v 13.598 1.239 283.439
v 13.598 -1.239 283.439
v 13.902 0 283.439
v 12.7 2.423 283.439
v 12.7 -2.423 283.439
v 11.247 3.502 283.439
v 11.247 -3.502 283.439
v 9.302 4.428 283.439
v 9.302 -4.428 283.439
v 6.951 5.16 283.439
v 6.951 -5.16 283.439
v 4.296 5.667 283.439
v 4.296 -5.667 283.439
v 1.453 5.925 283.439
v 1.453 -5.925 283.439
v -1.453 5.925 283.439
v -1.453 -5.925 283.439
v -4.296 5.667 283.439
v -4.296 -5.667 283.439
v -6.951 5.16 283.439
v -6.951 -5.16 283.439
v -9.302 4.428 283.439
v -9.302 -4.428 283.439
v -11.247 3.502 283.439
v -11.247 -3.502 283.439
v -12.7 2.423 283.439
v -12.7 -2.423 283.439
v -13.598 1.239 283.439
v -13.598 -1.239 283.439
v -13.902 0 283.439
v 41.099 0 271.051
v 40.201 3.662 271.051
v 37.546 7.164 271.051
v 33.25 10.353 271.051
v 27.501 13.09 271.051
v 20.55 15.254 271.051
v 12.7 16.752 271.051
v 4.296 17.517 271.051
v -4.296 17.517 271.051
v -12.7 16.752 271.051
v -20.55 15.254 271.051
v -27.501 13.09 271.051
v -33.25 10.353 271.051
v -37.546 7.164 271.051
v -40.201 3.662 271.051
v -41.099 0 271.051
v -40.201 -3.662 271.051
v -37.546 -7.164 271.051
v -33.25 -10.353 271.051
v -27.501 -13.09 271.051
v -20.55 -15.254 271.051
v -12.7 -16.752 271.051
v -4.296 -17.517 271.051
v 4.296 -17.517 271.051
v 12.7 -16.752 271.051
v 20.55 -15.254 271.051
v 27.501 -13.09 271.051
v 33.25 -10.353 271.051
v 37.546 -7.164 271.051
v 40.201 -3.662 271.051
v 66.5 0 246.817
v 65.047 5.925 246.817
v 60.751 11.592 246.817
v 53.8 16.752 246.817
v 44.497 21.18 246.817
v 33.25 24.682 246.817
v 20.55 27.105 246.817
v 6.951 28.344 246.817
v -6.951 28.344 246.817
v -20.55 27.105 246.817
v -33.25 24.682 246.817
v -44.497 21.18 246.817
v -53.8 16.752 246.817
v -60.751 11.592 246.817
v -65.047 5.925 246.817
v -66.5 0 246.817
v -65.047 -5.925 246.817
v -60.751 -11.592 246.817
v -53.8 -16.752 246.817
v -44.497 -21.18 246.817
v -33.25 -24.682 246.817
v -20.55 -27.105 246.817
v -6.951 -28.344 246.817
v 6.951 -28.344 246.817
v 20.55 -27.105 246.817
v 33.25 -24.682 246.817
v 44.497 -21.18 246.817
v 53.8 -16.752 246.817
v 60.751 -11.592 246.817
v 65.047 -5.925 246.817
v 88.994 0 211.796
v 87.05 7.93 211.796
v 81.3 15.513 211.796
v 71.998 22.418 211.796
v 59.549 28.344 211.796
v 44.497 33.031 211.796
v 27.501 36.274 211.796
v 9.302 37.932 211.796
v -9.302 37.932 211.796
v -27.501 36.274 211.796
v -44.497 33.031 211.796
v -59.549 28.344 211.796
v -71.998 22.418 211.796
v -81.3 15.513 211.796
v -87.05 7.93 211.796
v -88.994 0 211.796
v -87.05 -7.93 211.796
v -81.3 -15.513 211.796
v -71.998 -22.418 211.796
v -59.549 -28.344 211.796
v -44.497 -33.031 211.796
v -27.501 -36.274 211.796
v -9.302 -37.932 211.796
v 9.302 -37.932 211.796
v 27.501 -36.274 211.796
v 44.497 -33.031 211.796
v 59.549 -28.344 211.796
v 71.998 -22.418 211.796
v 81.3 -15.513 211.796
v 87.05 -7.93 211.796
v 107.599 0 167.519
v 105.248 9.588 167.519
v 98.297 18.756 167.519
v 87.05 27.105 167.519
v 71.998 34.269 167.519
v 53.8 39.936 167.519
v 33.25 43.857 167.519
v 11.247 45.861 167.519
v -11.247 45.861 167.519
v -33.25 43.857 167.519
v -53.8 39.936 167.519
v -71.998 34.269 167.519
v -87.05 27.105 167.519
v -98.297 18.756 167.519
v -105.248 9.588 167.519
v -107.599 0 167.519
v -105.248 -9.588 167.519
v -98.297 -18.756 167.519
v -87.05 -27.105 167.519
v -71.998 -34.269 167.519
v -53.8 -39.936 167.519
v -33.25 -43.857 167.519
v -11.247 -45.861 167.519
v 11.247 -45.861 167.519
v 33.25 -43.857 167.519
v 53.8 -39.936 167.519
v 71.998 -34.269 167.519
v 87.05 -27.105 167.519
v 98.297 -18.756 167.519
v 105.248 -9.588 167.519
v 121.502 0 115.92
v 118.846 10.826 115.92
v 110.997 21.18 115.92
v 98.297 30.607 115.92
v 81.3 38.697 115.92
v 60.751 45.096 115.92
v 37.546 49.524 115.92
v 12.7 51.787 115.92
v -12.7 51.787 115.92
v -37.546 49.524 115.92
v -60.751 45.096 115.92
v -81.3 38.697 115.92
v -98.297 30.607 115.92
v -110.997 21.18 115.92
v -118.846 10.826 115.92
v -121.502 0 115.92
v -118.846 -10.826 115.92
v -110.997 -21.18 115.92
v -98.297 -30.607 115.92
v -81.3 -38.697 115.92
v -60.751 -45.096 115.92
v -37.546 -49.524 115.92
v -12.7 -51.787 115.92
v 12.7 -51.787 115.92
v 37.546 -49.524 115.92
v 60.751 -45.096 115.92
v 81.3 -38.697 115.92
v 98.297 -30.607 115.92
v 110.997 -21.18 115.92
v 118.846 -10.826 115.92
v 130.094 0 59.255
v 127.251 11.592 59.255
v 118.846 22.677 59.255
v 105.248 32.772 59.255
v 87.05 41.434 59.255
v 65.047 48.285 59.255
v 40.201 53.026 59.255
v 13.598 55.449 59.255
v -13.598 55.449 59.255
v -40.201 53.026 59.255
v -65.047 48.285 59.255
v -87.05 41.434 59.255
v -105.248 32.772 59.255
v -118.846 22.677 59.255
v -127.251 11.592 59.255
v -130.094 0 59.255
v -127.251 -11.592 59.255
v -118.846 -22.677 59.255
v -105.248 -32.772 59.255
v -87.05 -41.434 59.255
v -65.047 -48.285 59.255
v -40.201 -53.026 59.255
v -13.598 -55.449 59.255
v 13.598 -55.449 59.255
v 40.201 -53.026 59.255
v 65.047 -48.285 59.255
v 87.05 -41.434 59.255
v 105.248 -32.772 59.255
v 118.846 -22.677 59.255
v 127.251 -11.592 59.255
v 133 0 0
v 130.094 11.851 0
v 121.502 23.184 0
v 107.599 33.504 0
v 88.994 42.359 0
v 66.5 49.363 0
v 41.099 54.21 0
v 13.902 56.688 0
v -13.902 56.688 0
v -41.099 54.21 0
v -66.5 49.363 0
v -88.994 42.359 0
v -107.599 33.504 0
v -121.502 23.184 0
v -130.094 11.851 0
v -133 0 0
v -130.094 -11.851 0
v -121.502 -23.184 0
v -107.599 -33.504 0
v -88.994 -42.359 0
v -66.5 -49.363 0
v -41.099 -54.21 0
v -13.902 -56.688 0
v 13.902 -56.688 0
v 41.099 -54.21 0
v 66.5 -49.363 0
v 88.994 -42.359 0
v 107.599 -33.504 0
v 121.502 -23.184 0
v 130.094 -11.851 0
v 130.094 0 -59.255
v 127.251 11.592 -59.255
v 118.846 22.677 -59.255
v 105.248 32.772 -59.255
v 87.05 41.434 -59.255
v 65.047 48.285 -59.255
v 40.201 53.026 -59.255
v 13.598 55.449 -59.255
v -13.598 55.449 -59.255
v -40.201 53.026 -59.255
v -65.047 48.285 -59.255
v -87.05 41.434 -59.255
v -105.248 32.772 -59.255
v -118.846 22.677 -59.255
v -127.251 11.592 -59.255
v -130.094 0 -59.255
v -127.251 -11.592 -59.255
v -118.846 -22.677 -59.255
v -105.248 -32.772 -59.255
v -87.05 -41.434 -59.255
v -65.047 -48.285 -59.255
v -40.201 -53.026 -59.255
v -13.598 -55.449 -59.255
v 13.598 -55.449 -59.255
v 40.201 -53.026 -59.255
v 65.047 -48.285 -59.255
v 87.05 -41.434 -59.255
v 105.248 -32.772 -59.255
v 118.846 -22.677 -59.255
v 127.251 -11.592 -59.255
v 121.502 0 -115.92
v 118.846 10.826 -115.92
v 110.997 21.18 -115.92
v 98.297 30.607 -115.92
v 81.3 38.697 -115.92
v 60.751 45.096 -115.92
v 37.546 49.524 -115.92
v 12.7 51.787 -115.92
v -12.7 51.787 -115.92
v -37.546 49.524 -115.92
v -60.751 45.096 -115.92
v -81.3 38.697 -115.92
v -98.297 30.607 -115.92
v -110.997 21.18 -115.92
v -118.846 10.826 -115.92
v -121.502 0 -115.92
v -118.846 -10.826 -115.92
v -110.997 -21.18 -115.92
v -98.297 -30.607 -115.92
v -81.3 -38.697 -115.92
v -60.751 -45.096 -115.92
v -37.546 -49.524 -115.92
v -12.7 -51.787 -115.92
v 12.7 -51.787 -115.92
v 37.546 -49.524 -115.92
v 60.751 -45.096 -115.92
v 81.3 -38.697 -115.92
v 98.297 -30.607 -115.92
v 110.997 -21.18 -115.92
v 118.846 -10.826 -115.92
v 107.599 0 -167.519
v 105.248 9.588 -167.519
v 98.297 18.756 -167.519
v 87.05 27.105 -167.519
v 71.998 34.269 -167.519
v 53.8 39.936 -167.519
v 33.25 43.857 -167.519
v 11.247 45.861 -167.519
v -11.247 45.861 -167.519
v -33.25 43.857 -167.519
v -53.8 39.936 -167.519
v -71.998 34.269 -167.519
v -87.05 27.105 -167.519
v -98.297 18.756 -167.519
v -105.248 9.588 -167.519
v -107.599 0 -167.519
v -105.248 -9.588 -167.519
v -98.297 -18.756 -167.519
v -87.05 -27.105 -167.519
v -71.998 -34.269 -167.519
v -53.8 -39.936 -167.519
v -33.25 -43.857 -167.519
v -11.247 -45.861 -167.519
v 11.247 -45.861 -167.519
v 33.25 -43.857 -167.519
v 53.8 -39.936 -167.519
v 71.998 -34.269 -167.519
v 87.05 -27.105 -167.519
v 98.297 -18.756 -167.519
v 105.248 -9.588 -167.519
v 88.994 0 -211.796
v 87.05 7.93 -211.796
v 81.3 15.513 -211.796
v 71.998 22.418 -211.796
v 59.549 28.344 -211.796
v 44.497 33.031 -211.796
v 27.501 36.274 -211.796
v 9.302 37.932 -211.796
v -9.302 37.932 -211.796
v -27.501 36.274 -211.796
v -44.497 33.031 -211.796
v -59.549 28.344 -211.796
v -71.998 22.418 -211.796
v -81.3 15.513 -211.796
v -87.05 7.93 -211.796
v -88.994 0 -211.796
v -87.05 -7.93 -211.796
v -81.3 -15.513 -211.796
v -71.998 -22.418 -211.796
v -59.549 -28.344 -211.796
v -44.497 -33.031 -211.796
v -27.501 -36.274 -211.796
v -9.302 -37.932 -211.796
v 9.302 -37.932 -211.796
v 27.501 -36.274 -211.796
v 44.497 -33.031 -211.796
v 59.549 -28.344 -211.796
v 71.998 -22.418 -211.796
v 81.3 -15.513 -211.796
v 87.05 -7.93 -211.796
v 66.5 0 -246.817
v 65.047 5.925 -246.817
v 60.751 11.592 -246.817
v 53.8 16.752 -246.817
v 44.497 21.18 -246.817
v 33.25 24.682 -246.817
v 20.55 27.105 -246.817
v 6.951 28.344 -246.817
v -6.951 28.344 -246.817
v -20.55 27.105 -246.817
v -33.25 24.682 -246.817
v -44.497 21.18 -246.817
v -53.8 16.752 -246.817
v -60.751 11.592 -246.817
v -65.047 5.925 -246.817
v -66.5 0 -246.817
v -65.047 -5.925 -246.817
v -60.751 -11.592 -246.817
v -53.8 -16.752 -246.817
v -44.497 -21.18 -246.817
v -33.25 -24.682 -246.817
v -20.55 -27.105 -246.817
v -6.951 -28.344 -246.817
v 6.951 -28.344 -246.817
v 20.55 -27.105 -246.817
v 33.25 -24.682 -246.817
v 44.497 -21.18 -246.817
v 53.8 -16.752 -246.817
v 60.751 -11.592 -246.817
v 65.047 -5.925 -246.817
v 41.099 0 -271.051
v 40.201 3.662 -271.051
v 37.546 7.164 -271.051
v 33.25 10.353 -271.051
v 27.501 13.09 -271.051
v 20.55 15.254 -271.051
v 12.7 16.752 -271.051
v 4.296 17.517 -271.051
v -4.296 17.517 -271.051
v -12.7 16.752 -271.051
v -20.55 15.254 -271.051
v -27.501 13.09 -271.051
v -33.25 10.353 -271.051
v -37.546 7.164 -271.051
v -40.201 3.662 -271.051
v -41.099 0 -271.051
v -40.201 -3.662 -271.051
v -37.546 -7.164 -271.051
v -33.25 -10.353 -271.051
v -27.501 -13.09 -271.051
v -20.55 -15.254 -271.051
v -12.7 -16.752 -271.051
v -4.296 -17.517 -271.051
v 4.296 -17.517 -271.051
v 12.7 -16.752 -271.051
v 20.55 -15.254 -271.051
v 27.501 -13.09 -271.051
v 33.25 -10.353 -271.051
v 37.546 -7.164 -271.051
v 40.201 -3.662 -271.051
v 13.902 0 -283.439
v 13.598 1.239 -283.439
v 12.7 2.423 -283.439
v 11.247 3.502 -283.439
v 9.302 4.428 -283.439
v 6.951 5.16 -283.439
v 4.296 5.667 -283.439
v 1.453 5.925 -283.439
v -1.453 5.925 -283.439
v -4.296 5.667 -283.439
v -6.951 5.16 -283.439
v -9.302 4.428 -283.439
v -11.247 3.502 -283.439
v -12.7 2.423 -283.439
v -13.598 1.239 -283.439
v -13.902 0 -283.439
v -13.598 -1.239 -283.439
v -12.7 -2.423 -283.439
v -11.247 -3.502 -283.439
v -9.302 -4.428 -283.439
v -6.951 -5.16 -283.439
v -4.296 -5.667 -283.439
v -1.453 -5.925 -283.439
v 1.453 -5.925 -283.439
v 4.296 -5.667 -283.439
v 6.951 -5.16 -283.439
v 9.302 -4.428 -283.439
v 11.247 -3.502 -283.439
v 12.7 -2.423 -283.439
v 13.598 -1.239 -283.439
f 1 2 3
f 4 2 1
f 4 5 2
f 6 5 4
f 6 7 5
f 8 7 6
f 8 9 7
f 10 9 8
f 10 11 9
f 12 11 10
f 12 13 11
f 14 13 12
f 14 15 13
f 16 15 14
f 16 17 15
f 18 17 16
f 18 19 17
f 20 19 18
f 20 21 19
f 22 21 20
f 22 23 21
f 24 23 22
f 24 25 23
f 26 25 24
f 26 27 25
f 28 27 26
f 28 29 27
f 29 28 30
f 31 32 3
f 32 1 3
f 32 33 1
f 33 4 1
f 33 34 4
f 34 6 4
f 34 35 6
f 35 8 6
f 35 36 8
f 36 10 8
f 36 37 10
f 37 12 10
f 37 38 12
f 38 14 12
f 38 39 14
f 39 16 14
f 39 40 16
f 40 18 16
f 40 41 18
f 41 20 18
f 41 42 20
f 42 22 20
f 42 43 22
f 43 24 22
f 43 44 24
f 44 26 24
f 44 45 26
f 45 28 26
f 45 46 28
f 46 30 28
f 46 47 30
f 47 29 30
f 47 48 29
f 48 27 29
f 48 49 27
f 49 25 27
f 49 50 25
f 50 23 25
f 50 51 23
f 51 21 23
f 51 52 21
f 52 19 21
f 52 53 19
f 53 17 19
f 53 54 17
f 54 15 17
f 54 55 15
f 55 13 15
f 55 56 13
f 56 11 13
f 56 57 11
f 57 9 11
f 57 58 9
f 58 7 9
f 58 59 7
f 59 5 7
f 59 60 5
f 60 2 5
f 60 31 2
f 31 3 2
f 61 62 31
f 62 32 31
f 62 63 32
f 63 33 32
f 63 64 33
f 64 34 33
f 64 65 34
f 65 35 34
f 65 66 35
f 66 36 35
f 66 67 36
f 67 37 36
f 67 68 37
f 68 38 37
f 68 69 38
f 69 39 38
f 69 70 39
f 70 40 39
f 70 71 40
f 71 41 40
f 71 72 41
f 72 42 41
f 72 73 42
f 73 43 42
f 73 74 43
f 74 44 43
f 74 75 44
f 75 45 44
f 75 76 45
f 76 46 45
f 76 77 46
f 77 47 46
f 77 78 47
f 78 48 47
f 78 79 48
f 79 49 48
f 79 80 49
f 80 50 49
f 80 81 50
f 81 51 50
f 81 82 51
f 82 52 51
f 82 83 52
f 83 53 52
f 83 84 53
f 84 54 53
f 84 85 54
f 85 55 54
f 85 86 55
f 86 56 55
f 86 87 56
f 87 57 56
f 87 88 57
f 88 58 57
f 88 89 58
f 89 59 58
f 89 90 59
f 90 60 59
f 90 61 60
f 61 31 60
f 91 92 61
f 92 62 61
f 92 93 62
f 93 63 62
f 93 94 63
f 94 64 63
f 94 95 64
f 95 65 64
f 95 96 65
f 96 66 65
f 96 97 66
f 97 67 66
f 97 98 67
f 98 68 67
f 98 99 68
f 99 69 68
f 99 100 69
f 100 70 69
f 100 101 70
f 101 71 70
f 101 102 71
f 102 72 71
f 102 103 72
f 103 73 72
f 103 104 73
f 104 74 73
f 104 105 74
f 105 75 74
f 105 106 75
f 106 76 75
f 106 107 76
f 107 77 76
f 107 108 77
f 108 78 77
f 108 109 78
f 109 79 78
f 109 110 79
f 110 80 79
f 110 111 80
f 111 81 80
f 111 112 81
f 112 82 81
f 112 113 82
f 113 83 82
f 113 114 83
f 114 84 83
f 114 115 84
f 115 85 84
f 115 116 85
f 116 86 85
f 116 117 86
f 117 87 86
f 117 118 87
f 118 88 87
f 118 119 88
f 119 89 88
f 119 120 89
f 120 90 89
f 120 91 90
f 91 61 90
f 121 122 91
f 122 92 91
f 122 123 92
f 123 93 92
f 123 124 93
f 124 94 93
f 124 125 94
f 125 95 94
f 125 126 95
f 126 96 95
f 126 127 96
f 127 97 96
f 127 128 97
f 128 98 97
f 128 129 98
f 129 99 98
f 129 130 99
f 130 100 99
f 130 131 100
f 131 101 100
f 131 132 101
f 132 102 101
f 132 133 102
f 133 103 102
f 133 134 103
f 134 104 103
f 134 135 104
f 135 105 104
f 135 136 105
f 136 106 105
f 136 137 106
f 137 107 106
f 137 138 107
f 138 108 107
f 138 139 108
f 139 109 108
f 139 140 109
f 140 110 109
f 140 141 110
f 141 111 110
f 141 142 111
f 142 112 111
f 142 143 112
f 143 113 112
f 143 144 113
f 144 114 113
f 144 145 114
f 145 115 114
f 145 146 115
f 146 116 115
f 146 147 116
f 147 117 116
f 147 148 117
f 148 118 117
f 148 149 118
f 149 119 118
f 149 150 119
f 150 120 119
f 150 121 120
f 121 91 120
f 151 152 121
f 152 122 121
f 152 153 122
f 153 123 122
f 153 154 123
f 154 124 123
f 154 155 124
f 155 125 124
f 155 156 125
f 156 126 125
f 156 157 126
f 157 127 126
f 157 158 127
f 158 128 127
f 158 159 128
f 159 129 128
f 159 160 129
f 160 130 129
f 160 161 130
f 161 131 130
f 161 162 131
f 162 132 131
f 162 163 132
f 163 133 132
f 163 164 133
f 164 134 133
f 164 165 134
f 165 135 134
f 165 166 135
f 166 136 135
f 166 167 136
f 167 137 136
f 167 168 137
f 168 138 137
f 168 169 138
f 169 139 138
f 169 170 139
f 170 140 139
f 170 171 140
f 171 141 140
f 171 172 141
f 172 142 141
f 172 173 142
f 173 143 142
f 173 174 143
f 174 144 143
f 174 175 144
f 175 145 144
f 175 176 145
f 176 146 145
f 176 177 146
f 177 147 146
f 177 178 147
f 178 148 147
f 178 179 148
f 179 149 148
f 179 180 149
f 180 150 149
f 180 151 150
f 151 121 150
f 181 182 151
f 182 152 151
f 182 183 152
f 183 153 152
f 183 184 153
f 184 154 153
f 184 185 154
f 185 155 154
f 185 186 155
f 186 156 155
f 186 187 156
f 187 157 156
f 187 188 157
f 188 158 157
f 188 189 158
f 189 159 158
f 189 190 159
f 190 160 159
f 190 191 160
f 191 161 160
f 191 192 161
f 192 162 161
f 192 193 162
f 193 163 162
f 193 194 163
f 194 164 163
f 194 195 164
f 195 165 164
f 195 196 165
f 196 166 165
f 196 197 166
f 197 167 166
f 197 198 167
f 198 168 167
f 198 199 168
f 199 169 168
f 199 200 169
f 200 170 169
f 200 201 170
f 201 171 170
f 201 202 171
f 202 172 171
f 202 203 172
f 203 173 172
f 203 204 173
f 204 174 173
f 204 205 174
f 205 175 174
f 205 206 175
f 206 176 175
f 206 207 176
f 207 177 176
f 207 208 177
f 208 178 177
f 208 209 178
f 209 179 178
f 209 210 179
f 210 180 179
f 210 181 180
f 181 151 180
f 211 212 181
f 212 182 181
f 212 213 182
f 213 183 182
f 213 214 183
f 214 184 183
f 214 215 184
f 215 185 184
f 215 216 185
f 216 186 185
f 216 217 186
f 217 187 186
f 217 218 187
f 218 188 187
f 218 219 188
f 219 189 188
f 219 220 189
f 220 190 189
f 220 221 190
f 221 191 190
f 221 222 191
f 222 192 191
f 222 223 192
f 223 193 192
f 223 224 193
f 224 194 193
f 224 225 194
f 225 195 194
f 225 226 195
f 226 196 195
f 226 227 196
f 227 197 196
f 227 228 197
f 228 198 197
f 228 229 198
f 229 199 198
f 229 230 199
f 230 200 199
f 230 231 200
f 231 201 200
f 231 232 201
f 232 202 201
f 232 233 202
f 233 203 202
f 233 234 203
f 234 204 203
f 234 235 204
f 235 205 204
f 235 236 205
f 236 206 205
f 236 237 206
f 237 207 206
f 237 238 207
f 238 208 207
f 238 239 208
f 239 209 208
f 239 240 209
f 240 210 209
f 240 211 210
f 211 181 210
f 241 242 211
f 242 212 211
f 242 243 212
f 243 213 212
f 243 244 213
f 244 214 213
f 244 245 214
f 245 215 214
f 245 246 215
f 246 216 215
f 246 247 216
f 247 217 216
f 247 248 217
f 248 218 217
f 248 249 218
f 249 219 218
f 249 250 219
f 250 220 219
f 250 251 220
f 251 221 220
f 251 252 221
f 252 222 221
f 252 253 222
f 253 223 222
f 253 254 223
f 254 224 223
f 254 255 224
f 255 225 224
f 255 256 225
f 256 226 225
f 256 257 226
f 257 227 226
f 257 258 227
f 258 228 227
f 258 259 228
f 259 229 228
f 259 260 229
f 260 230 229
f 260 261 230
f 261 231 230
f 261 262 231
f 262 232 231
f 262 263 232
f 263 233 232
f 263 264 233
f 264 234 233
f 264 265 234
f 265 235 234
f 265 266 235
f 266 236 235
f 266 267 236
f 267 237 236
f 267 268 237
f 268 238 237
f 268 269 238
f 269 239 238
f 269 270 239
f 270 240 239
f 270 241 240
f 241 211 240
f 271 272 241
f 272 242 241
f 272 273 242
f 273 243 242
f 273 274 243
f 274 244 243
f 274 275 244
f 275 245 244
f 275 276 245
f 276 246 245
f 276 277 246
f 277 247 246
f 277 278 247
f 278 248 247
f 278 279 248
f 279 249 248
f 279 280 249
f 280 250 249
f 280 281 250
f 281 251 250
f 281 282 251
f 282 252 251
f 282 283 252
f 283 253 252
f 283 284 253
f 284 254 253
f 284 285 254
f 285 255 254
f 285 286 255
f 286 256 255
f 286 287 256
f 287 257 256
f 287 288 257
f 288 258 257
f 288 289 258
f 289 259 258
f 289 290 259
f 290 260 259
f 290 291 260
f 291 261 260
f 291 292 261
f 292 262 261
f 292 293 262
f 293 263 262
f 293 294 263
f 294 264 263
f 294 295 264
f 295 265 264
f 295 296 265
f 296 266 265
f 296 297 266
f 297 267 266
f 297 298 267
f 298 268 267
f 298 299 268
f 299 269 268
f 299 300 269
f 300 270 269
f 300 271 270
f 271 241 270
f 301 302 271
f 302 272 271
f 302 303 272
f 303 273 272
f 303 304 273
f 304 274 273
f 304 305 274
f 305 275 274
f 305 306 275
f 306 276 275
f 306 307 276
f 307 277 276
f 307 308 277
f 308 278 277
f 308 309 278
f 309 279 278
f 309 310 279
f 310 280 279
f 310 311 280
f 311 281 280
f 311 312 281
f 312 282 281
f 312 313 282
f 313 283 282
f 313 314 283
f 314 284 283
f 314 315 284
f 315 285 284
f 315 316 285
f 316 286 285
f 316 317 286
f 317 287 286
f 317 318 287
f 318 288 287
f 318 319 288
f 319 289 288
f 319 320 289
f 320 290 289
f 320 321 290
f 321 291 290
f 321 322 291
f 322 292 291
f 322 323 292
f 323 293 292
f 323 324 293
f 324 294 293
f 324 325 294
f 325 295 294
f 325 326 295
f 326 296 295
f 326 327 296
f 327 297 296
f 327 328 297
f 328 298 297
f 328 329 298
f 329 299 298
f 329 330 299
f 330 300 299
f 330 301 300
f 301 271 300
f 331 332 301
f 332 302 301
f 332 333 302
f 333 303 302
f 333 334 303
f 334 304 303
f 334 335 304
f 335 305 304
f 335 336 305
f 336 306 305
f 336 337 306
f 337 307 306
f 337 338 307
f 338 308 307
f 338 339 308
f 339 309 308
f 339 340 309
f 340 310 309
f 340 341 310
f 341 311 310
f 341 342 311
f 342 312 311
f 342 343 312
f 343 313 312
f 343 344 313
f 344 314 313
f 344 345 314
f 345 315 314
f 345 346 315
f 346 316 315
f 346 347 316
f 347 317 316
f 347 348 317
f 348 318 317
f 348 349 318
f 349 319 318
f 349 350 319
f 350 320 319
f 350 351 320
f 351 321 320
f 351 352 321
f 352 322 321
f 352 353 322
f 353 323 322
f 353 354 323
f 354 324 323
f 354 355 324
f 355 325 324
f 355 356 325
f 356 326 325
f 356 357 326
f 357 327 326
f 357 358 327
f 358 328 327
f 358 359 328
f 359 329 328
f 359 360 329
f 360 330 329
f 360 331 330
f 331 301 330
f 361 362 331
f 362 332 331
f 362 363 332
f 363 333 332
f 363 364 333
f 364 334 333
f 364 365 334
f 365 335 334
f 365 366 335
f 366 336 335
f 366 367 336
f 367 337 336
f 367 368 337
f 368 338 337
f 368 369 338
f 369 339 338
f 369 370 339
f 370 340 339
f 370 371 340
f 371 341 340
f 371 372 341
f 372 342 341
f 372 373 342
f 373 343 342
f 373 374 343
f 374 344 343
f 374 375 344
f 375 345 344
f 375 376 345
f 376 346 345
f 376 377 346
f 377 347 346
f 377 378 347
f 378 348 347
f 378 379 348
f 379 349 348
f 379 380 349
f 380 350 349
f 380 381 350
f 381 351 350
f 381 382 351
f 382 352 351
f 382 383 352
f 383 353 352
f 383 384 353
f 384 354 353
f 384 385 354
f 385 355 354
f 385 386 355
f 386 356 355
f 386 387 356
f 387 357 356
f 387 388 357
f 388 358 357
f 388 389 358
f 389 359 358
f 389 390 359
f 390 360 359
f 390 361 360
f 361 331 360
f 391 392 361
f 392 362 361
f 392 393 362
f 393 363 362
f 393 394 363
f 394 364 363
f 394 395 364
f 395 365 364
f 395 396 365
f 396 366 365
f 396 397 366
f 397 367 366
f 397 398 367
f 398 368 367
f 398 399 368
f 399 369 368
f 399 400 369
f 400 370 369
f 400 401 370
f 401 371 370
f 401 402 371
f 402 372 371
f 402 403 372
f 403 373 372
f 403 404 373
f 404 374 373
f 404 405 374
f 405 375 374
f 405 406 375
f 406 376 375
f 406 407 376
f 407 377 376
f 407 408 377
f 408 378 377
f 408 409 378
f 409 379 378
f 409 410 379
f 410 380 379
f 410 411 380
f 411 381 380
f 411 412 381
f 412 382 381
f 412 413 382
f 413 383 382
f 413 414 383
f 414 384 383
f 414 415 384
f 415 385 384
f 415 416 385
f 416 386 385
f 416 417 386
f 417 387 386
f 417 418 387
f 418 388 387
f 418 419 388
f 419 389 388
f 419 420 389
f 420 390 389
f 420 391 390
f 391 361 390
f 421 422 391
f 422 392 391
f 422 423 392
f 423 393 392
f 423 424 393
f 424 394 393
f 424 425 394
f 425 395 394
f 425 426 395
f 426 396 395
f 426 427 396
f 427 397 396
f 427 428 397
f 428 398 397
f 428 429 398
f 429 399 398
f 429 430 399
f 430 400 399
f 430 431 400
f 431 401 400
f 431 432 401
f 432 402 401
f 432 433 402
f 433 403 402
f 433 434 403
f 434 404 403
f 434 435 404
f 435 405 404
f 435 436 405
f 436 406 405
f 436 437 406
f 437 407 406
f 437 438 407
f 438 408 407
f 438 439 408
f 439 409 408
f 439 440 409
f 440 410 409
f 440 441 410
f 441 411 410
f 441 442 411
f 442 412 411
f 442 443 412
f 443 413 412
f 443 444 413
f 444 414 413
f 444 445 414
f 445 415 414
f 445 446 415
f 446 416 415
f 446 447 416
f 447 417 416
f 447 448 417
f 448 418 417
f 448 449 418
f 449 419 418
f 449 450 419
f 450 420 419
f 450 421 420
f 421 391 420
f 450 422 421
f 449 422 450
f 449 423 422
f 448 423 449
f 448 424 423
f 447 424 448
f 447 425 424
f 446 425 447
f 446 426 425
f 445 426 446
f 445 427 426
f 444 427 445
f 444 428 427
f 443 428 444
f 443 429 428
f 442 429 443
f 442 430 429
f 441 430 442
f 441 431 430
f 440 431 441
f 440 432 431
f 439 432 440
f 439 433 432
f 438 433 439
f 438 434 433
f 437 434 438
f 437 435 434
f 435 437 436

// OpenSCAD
// Generated by SolidPython 1.0.1 on 2020-07-29 00:46:47


scale(v = [7, 3, 15]) {
	sphere(r = 19);
}
/***********************************************
*********      SolidPython code:      **********
************************************************
 
# import packages: SolidPython
from solid import *
from solid.utils import *
from itertools import chain, combinations, permutations


class Resize:

    def __init__(self, scad_file):
        self.scad_file = scad_file
        #self.scad_file = import_scad(scad_file)
        # cone/cylinder param:
        self.r1 = 0
        self.r2 = 0
        self.h = 0
        # rectangular prism param:
        self.w = 0
        self.l = 0
        # ellipse param:
        self.r = 0

    # import OpenScad code (file name corresponds to shape)


    # classify shape + parameters
    def assign(self, param1, param2, param3):
        if self.scad_file == 'cone.scad':
            self.r1 = param1
            self.r2 = param2
            self.h = param3
        elif self.scad_file == 'cylinder.scad':
            self.r1 = param1
            self.r2 = param2
            self.h = param3
        elif self.scad_file == 'rectangularPrism.scad':
            self.h = param1
            self.l = param2
            self.w = param3
        else:
            self.r = param1
            self.h = param2

    # resize parameters
    def iterate(self):
        x = range(3, 20, 2)
        i = 1
        if self.scad_file == 'cone.scad':
            tempList = list(permutations(x, 2))
            for temp in tempList:
                param1 = temp[0]
                param2 = temp[1]
                filepath = 'produced_scad_files/' + 'cone' + str(param1) + '_' + str(param2) + '_' + '.scad'
                scad_render_to_file(cylinder(h=param1, r1=param2, r2=0), filepath)

        elif self.scad_file == 'cylinder.scad':
            tempList = list(permutations(x, 3))
            for temp in tempList:
                param1 = temp[0]
                param2 = temp[1]
                filepath = 'produced_scad_files/' + 'cylinder' + str(param1) + '_' + str(param2) + '_' + '.scad'
                scad_render_to_file(cylinder(h=param1, r1=param2, r2=param2), filepath)

        elif self.scad_file == 'rectangularPrism.scad':
            tempList = list(permutations(x, 3))
            for temp in tempList:
                param1 = temp[0]
                param2 = temp[1]
                param3 = temp[2]
                filepath = 'produced_scad_files/' + 'rectangularPrism' + str(param1) + '_' + str(param2) + '_' + str(
                    param3) + '.scad'
                scad_render_to_file(cube(size=(param1, param2, param3)), filepath)

        elif self.scad_file == 'ellipse.scad':
            tempList = list(permutations(x, 4))
            for temp in tempList:
                param1 = temp[0]
                param2 = temp[1]
                param3 = temp[2]
                param4 = temp[3]
                filepath = 'produced_scad_files/' + 'ellipse' + str(param1) + '_' + str(param2) + '_' + str(param3) + '_' + str(param4) + '.scad'
                scad_render_to_file(scale([param1, param2, param3])(sphere(r=param4)), filepath)

    def render_to_scadfile(self):
        scad_render_to_file(scad, 'example.scad') 
 
************************************************/
